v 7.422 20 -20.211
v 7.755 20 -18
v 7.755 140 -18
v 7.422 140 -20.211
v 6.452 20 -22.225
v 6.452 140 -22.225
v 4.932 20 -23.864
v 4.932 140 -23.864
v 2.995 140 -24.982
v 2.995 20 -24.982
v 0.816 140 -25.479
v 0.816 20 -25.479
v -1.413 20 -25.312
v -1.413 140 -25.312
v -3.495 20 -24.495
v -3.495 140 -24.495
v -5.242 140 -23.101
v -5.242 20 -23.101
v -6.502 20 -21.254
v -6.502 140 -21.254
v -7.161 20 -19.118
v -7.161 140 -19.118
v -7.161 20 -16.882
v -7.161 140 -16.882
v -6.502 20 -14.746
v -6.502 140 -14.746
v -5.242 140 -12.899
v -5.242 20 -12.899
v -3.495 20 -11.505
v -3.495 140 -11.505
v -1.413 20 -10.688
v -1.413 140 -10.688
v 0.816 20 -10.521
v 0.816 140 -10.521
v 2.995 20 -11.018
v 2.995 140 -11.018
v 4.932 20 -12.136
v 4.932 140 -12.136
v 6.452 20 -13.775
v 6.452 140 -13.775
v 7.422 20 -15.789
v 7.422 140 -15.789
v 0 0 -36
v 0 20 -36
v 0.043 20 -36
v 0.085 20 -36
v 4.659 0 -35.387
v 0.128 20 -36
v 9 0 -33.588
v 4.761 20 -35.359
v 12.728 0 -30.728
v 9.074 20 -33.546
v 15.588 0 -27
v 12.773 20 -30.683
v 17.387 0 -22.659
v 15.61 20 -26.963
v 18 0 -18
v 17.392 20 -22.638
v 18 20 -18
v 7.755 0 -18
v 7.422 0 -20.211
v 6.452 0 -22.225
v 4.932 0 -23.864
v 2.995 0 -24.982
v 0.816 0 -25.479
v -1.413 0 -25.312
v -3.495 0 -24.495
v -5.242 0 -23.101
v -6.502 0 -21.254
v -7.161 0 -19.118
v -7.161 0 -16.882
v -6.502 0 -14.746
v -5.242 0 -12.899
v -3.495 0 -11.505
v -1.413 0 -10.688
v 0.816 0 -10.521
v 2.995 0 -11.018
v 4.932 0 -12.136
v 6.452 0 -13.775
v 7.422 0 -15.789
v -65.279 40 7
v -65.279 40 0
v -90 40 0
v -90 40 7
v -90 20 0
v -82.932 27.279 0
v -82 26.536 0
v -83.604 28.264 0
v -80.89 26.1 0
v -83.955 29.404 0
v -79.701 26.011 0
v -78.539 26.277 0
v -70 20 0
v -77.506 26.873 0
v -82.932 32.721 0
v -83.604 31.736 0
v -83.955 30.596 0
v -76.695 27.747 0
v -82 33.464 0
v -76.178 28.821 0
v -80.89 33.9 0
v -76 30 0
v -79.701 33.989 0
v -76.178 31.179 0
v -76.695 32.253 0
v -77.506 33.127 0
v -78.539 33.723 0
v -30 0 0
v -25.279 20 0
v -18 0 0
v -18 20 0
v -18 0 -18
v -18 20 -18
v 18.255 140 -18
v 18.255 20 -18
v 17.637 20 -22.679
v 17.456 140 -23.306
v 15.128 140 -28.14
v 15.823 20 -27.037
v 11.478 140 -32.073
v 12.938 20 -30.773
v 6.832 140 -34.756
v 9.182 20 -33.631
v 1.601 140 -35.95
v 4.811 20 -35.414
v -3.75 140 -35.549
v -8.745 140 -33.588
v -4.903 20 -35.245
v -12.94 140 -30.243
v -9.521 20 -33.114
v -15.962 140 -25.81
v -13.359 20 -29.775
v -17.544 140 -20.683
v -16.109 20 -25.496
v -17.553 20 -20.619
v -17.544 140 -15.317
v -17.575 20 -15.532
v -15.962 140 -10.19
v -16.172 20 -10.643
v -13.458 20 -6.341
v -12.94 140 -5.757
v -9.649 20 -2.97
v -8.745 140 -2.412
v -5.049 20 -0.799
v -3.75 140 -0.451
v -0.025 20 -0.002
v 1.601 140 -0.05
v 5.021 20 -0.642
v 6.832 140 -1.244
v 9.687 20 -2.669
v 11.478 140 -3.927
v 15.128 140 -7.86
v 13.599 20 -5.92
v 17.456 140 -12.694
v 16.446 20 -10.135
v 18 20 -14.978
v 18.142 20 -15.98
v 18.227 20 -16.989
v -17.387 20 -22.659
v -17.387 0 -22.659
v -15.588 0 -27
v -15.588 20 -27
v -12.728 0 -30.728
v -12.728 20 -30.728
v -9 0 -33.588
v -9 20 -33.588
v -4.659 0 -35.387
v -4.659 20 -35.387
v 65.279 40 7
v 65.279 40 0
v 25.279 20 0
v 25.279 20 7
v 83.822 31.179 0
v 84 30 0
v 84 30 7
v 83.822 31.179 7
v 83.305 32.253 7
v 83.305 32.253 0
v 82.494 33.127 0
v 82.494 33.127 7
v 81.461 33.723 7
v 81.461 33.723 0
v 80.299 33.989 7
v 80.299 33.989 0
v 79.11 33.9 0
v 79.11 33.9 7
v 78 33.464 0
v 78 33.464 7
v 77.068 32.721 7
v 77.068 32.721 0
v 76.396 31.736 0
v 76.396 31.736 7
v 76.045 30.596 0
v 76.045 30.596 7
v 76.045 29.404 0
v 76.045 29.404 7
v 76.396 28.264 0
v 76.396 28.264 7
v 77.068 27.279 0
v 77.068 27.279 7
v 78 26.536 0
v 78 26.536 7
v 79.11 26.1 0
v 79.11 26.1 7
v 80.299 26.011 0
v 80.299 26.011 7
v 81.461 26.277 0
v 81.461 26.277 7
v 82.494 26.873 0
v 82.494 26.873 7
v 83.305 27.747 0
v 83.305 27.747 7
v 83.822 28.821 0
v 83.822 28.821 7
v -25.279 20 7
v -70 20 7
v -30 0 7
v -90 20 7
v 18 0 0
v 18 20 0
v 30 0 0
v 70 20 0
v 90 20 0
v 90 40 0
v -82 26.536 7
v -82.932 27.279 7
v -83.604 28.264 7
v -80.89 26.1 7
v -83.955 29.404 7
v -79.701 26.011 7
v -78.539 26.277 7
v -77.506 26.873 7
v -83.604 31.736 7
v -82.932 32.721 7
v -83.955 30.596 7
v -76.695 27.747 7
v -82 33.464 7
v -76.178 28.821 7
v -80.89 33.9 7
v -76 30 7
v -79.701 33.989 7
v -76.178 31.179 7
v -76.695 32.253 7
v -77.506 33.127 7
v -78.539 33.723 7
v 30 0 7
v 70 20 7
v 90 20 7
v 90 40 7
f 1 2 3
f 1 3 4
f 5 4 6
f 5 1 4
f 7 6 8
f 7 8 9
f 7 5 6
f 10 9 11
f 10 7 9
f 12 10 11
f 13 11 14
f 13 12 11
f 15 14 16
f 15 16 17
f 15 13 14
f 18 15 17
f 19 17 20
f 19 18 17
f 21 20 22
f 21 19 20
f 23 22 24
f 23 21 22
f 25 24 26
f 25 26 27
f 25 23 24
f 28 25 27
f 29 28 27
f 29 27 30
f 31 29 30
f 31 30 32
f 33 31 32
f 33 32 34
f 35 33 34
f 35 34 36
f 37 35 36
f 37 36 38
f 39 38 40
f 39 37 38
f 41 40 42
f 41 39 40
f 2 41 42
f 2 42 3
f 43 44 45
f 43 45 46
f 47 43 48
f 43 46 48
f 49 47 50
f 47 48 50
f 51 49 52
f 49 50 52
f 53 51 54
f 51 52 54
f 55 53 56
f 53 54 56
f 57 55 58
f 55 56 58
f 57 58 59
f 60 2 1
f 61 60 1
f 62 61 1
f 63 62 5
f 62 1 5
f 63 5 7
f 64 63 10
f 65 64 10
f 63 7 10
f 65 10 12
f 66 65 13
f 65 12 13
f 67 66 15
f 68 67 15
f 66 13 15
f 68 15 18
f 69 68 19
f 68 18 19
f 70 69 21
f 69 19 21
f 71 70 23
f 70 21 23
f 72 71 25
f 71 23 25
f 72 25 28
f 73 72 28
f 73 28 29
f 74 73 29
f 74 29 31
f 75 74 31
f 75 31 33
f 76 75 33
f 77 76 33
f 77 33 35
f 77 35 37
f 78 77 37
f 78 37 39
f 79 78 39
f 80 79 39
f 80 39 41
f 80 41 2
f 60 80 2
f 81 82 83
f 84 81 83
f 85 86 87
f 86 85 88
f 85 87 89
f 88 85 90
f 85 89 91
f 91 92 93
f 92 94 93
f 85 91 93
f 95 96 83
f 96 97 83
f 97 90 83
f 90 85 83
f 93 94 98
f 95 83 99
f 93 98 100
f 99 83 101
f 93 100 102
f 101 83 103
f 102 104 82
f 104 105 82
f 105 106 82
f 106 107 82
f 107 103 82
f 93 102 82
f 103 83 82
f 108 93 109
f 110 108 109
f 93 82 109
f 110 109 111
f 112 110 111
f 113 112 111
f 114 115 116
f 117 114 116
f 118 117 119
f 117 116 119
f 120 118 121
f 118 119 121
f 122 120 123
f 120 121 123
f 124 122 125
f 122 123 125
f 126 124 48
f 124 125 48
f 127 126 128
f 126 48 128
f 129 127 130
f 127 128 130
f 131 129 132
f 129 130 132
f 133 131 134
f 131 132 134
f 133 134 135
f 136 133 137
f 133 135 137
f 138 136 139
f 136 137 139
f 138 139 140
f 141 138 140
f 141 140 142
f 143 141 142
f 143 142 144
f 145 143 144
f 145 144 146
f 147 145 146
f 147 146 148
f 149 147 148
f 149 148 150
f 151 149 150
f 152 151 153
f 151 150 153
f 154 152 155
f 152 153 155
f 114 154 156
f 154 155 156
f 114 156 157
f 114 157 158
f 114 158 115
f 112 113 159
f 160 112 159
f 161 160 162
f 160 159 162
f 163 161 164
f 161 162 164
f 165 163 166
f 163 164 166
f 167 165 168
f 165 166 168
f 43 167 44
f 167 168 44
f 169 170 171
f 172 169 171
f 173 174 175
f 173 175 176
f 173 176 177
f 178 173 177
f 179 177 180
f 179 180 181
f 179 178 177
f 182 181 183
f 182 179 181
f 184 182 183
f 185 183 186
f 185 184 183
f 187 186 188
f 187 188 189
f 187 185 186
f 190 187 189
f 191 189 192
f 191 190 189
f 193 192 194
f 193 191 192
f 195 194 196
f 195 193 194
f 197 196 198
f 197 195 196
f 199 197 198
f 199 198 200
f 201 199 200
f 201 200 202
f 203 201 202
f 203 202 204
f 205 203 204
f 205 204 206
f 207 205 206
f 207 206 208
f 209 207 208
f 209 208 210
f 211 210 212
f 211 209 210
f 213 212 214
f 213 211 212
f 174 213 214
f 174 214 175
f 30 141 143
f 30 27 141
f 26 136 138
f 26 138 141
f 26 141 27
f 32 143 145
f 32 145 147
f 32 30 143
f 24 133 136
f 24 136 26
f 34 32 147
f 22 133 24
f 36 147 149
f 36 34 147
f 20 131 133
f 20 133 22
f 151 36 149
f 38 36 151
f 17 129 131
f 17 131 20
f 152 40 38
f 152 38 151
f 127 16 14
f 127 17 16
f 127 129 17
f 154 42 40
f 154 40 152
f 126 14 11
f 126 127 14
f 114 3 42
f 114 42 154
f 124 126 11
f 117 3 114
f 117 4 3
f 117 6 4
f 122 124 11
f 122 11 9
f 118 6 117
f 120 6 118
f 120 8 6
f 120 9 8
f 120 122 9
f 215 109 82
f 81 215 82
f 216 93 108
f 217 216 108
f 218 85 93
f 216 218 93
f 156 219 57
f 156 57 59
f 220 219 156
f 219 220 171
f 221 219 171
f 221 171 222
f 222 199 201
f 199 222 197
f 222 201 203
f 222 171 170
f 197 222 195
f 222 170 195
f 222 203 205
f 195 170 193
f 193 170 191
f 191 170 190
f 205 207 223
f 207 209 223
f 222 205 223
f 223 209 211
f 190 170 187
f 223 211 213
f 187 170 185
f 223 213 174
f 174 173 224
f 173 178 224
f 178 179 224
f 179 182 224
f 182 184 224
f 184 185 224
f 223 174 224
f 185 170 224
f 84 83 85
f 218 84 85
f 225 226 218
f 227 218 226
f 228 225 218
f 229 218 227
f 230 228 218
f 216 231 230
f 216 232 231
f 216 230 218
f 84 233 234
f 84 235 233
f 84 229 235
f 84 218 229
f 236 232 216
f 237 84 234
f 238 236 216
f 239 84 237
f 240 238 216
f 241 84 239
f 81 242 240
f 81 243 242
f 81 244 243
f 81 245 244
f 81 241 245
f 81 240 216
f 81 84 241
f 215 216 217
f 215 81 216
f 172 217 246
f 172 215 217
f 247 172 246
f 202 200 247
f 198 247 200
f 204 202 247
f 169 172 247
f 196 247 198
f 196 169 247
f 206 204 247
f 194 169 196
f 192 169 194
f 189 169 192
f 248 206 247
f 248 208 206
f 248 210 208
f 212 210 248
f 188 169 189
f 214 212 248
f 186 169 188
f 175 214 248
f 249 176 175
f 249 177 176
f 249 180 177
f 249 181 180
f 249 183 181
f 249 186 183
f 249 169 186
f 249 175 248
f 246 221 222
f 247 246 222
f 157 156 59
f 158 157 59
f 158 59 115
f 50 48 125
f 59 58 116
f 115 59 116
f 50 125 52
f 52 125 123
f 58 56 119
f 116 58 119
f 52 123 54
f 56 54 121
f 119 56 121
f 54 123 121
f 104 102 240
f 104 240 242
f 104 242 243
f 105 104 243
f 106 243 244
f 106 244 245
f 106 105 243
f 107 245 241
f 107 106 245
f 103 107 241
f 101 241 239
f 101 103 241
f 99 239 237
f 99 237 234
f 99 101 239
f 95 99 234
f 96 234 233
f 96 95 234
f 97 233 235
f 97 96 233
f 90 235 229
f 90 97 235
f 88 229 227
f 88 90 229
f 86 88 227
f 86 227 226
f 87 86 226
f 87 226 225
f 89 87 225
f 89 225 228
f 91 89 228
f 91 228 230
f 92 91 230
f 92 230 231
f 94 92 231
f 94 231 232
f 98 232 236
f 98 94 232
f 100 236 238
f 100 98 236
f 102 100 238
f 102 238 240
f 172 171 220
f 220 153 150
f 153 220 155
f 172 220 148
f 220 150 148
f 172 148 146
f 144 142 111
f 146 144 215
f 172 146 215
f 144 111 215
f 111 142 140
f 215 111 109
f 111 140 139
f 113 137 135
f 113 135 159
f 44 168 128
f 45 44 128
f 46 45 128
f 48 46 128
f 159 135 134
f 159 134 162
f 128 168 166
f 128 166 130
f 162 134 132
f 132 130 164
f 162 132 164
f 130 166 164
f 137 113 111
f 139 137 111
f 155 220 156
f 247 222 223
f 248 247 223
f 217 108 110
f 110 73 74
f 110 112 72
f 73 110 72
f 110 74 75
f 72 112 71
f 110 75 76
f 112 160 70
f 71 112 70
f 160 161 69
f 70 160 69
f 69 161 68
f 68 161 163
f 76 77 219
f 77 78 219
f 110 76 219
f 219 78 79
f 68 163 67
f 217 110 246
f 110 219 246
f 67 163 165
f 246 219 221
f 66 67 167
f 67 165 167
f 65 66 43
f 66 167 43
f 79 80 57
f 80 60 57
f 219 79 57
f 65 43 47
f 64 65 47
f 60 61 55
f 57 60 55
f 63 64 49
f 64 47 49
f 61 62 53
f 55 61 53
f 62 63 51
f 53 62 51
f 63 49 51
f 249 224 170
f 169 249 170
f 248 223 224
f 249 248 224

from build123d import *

# Parameters (mm, degrees)
SKETCH_1_R          = 4
EXTRUDE_1_DEPTH     = 7
SKETCH_2_W          = 36
SKETCH_2_H          = 20
EXTRUDE_2_DEPTH     = 36
SKETCH_3_R          = 7.5
CUT_EXTRUDE_2_DEPTH = 36
SKETCH_4_R          = 18
SKETCH_4_R_2        = 7.5
EXTRUDE_3_DEPTH     = 120


with BuildPart() as part:
    # 草图1 → 凸台-拉伸1 (new body)
    with BuildSketch(Plane.XY):
        Polygon((-30, 0), (30, 0), (70, 20), (90, 20), (90, 40), (65.27864045, 40), (25.27864045, 20), (-25.27864045, 20), (-65.27864045, 40), (-90, 40), (-90, 20), (-70, 20), align=None)
        with Locations((80, 30)):
            Circle(SKETCH_1_R, mode=Mode.SUBTRACT)
        with Locations((-80, 30)):
            Circle(SKETCH_1_R, mode=Mode.SUBTRACT)
    extrude(amount=EXTRUDE_1_DEPTH)

    # 草图2 → 凸台-拉伸2 (add)
    with BuildSketch(Plane(origin=(0, 0, 0), x_dir=(-1, 0, 0), z_dir=(0, 0, -1))):
        with Locations((0, 10)):
            Rectangle(SKETCH_2_W, SKETCH_2_H)
    extrude(amount=EXTRUDE_2_DEPTH)

    # 草图3 → 切除-拉伸2 (cut)
    with BuildSketch(Plane(origin=(0, 20, 0), x_dir=(1, 0, 0), z_dir=(0, 1, 0))):
        with BuildLine():
            ThreePointArc((-6.6e-08, 36), (12.727922038, 30.727922085), (18, 18))
            Line((18, 18), (18, 36))
            Line((18, 36), (-6.6e-08, 36))
        make_face()
        with BuildLine():
            Line((-18, 36), (-18, 18))
            ThreePointArc((-18, 18), (-12.727922085, 30.727922038), (-6.6e-08, 36))
            Line((-6.6e-08, 36), (-18, 36))
        make_face()
        with Locations((0.255418615, 18)):
            Circle(SKETCH_3_R)
    extrude(amount=-CUT_EXTRUDE_2_DEPTH, mode=Mode.SUBTRACT)

    # 草图4 → 凸台-拉伸3 (add)
    with BuildSketch(Plane(origin=(0, 20, 0), x_dir=(1, 0, 0), z_dir=(0, 1, 0))):
        with Locations((0.255418615, 18)):
            Circle(SKETCH_4_R)
        with Locations((0.255418615, 18)):
            Circle(SKETCH_4_R_2, mode=Mode.SUBTRACT)
    extrude(amount=EXTRUDE_3_DEPTH)


solid = part.part
